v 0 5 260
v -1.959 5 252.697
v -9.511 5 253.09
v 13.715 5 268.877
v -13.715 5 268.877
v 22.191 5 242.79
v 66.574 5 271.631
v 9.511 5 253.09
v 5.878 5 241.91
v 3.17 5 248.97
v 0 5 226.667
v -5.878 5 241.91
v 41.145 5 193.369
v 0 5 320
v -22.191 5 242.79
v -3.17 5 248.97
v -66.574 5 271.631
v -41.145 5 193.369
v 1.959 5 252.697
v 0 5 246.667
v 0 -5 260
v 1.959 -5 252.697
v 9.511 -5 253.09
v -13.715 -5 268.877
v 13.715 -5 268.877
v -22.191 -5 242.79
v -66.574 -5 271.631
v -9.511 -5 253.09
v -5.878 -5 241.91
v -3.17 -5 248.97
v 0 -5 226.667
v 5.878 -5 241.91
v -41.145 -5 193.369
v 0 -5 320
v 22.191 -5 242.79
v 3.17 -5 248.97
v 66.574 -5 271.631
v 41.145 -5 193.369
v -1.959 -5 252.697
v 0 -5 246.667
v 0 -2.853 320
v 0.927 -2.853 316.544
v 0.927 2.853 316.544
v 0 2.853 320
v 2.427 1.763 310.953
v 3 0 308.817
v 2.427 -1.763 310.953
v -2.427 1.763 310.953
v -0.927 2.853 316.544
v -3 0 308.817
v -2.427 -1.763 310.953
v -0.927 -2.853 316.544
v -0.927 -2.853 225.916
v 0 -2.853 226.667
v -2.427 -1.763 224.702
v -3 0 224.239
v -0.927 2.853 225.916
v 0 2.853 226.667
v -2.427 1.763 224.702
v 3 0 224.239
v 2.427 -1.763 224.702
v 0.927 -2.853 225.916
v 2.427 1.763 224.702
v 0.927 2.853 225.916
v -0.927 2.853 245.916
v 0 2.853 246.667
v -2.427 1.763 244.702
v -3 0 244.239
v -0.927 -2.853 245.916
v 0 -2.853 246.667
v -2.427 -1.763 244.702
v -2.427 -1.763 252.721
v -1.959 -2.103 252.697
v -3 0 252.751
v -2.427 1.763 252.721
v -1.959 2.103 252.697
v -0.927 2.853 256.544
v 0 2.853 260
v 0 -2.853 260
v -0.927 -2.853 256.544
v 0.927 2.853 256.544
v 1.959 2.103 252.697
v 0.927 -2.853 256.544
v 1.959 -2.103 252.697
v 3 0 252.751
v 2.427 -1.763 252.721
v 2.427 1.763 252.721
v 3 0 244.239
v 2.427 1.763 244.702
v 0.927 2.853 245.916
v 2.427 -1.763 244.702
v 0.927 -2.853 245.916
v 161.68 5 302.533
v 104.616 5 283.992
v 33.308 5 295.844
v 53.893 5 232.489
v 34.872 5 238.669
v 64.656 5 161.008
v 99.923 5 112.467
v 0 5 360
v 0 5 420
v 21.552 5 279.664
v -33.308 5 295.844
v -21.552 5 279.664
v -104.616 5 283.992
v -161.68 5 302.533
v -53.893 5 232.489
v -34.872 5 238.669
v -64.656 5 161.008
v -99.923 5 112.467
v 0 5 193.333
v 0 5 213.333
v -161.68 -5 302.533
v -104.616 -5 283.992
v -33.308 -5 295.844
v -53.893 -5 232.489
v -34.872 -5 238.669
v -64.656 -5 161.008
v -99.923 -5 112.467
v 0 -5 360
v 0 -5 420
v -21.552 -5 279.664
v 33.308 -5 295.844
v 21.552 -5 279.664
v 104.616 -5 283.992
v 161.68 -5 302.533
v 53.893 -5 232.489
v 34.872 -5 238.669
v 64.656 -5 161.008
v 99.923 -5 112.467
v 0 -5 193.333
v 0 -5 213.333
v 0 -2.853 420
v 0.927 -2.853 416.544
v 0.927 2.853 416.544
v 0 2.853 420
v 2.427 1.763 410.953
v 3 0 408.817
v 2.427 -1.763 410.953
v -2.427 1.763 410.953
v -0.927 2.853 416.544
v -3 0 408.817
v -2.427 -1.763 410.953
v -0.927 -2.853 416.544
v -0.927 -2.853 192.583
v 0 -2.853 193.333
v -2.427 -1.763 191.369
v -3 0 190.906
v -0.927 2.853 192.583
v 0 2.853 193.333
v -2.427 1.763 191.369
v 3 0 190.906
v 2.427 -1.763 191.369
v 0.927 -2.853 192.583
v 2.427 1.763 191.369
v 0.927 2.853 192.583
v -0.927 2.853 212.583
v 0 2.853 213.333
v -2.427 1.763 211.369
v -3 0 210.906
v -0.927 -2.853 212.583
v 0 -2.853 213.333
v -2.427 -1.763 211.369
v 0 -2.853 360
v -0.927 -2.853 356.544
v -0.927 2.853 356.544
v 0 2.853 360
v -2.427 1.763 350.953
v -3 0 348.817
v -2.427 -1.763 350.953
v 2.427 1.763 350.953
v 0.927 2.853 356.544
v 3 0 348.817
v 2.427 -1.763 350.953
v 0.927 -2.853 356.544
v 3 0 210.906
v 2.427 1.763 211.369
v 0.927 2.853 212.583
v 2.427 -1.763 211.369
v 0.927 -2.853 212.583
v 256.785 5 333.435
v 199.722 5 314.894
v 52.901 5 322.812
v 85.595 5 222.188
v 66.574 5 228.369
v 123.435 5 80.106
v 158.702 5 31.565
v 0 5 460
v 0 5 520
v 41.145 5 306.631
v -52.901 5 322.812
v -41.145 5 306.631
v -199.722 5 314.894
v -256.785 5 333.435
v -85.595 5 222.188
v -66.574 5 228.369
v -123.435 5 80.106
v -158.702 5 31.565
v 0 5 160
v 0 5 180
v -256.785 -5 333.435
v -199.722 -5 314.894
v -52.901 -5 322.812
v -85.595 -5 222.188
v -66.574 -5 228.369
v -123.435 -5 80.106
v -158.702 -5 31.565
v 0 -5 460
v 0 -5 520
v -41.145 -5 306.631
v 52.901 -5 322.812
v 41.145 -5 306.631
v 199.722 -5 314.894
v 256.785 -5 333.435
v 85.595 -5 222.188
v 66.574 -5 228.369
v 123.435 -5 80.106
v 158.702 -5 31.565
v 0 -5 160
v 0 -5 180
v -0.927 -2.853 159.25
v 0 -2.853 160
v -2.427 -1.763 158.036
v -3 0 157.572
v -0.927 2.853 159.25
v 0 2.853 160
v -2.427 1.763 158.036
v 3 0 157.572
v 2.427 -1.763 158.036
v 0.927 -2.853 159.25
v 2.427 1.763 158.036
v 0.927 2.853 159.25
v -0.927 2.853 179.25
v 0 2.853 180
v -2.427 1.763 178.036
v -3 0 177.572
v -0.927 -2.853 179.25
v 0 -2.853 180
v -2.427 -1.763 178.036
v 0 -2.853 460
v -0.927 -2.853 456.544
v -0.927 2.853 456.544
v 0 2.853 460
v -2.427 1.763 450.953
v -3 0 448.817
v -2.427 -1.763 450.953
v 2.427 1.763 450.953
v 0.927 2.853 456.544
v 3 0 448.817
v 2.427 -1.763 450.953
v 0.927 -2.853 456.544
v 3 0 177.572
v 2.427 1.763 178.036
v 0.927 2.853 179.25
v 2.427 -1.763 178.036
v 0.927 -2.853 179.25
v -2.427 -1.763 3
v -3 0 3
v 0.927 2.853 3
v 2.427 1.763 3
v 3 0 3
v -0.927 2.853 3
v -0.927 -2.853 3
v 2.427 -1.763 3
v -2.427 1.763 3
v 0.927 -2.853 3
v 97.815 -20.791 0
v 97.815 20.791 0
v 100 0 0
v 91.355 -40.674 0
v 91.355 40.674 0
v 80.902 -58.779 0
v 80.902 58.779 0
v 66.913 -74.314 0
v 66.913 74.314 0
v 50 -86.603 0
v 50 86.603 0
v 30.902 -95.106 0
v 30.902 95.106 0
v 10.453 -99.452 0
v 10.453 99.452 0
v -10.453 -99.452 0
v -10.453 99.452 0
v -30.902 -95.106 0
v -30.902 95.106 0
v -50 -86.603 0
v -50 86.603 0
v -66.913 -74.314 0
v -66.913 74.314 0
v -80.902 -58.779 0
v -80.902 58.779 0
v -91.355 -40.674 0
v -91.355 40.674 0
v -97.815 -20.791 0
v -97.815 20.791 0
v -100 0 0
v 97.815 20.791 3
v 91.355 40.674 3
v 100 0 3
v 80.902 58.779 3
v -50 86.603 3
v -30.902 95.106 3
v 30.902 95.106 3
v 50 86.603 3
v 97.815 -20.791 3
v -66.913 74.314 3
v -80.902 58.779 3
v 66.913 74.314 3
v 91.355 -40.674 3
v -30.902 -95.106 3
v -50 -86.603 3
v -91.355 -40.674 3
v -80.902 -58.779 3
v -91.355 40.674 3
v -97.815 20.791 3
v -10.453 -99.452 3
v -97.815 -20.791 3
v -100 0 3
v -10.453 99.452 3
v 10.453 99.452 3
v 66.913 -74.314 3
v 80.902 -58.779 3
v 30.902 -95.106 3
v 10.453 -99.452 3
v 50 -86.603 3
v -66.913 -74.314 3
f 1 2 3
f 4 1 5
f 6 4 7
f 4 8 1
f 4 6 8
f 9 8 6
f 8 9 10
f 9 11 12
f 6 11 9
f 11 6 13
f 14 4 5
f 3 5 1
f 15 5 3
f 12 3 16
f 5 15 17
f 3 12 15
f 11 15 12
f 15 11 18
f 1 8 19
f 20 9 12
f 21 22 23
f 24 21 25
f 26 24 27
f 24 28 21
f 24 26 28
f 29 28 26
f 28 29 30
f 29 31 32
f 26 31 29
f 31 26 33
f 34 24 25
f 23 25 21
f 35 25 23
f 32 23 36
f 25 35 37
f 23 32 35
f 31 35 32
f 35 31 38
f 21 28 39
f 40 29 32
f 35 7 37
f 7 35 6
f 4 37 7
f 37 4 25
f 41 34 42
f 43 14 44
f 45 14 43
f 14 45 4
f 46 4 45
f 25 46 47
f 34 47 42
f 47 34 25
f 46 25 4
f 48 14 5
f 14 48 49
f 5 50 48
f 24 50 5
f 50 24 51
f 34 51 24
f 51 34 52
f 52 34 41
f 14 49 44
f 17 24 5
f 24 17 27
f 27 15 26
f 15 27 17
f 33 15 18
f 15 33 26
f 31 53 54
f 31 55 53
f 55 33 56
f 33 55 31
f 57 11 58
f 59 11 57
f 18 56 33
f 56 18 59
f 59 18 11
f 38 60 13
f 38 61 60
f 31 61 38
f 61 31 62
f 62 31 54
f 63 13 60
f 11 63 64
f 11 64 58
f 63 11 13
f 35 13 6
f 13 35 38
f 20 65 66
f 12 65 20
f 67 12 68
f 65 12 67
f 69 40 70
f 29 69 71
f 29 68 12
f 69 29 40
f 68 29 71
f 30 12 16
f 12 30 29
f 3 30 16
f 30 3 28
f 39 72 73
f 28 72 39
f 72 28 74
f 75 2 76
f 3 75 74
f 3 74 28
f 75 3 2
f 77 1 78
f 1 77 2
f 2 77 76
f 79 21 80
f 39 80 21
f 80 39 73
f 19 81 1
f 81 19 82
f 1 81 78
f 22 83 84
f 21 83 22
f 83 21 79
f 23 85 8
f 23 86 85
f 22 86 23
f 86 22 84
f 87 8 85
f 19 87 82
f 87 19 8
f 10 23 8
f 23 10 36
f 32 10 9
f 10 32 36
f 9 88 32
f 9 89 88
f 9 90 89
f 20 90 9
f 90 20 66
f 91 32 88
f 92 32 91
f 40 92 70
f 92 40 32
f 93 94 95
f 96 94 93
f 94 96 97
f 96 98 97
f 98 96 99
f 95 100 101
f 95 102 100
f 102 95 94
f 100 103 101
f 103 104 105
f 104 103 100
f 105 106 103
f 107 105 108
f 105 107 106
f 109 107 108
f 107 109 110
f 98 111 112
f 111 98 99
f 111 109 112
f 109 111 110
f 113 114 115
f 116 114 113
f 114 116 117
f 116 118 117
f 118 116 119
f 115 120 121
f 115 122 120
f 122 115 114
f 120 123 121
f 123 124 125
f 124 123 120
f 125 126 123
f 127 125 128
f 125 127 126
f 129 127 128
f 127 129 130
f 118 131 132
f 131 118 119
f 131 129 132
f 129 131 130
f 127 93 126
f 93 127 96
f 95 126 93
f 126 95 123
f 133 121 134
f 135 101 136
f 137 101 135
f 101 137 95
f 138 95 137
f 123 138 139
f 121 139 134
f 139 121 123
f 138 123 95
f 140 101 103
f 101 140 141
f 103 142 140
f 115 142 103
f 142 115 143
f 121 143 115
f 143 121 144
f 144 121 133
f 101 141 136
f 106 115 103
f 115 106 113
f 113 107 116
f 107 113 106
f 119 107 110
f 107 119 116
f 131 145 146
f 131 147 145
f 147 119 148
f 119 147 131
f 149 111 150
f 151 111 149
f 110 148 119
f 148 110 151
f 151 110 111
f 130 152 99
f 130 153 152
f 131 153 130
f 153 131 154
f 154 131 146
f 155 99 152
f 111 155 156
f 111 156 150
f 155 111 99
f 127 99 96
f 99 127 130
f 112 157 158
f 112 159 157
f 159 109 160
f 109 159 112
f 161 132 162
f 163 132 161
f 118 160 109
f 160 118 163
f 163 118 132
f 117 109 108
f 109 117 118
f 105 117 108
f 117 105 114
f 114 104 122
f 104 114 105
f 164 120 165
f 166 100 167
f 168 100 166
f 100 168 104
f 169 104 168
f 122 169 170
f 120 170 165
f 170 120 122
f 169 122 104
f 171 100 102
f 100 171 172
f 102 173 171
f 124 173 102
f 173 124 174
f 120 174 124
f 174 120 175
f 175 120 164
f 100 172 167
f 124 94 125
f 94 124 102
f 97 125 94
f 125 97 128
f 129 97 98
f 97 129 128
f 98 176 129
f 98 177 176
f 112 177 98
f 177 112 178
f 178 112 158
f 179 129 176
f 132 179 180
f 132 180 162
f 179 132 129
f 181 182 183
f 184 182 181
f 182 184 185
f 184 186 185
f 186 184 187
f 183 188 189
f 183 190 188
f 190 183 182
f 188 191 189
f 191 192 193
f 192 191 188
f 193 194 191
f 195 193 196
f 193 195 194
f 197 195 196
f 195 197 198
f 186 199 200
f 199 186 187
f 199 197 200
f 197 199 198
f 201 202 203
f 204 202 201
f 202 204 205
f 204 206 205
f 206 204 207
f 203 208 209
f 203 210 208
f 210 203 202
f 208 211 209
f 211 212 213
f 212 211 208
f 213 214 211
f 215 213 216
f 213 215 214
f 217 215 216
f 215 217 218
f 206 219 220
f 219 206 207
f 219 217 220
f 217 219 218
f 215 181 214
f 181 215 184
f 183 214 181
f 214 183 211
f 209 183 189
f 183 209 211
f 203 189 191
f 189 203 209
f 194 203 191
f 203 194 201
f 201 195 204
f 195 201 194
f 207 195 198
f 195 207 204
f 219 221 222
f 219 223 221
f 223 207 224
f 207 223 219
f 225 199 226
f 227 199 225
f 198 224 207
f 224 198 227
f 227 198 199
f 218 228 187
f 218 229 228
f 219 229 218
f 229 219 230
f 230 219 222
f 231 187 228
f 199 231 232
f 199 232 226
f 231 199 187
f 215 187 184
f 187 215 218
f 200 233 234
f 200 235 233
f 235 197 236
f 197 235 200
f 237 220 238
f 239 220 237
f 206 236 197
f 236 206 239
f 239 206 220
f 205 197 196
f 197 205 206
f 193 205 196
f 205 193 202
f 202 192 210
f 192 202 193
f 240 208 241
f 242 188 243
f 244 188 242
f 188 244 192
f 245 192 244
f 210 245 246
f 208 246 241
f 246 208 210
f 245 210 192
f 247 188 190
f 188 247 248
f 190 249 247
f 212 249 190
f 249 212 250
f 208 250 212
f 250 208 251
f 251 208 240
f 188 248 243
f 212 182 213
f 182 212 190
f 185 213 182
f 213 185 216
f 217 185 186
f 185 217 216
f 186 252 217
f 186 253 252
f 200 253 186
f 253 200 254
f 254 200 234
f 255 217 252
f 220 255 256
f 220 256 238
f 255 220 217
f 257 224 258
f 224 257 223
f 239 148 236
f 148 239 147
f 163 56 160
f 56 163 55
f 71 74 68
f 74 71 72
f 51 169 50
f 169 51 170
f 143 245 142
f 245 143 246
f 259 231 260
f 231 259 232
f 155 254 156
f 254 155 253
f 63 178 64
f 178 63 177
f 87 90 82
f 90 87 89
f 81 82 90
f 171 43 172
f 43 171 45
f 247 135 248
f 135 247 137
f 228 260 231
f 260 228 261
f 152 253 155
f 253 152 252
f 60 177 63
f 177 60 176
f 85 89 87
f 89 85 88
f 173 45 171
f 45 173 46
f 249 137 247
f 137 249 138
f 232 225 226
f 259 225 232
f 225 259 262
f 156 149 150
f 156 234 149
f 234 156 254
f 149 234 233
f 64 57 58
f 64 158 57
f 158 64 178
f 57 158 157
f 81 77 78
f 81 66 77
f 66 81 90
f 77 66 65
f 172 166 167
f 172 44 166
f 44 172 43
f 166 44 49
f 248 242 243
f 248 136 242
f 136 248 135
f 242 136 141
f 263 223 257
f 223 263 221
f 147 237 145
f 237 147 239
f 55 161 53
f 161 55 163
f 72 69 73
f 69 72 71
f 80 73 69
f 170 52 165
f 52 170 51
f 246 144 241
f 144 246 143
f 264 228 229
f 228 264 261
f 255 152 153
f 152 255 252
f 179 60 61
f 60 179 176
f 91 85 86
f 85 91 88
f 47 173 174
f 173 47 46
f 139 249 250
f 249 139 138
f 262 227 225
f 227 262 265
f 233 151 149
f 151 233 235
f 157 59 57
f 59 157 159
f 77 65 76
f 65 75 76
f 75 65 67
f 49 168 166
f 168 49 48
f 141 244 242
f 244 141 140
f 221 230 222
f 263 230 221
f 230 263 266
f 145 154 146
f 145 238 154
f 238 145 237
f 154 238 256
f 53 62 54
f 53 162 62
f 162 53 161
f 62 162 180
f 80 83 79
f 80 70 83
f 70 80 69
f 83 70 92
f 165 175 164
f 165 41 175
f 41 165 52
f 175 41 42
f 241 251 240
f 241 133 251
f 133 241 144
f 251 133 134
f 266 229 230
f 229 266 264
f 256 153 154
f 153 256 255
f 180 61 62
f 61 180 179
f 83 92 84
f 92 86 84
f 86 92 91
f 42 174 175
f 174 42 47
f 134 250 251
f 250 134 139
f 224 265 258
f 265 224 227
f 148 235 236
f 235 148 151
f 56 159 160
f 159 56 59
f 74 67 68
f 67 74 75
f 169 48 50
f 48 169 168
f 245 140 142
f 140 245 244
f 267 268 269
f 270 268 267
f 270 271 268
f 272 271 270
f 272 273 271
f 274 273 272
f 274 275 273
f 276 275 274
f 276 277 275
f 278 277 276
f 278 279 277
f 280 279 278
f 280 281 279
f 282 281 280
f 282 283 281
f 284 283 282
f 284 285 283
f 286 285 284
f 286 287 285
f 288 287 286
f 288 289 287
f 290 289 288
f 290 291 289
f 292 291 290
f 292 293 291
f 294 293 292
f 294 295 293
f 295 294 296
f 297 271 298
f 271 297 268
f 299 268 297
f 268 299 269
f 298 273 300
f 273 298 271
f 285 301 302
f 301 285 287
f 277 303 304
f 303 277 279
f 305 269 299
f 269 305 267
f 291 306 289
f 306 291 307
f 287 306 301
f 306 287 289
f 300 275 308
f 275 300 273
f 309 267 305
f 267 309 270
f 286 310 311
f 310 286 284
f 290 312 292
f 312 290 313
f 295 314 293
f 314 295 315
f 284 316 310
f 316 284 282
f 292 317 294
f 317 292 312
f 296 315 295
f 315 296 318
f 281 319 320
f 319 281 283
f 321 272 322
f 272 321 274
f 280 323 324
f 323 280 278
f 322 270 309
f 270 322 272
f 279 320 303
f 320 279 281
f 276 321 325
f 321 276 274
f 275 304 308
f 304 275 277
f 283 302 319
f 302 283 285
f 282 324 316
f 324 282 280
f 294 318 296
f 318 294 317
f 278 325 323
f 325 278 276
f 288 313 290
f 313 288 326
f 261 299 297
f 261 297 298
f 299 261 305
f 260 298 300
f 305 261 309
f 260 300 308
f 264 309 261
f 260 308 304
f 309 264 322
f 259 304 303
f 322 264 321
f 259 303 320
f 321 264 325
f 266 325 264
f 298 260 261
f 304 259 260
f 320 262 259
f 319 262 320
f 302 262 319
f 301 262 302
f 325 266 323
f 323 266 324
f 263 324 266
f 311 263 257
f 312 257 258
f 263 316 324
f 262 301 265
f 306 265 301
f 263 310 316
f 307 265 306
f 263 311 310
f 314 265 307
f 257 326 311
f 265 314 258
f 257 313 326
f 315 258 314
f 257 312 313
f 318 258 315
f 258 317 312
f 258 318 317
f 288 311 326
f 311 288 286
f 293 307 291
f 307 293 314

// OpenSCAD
// 1) Enable animation
// 2) In animation fields, set FPS = 10, Steps = 400

nr = 5;
stars = 3;
seed = 35;

r = rands(1, 5, stars, seed);
function t(a) = a * 180 / nr;

module shape(size) {
    points = [
        for (a = [0:2 * nr - 1]) (size - size/1.5 * (a % 2)) * [-sin(t(a)), cos(t(a))]
    ];

    polygon(points);
}

echo(r);
for (a = [0:stars-1]) {
    color(a % 2 ? "Silver" : "Gold") {
        translate([0, 0, 250]) {
            rotate([90, 0, 360 * floor(r[a]) * $t]) {
                linear_extrude(10, center = true) {
                    difference() {
                        shape(10 + 100 * a + 60);
                        shape(10 + 100 * a);
                    }
                }
            }
        }
    }
}
color("White") {
    cylinder(h = 500, r = 3);
    cylinder(r = 100, h = 3);
}

// Written in 2020 by Torsten Paul <Torsten.Paul@gmx.de>
//
// To the extent possible under law, the author(s) have dedicated all
// copyright and related and neighboring rights to this software to the
// public domain worldwide. This software is distributed without any
// warranty.
//
// You should have received a copy of the CC0 Public Domain
// Dedication along with this software.
// If not, see <http://creativecommons.org/publicdomain/zero/1.0/>.
